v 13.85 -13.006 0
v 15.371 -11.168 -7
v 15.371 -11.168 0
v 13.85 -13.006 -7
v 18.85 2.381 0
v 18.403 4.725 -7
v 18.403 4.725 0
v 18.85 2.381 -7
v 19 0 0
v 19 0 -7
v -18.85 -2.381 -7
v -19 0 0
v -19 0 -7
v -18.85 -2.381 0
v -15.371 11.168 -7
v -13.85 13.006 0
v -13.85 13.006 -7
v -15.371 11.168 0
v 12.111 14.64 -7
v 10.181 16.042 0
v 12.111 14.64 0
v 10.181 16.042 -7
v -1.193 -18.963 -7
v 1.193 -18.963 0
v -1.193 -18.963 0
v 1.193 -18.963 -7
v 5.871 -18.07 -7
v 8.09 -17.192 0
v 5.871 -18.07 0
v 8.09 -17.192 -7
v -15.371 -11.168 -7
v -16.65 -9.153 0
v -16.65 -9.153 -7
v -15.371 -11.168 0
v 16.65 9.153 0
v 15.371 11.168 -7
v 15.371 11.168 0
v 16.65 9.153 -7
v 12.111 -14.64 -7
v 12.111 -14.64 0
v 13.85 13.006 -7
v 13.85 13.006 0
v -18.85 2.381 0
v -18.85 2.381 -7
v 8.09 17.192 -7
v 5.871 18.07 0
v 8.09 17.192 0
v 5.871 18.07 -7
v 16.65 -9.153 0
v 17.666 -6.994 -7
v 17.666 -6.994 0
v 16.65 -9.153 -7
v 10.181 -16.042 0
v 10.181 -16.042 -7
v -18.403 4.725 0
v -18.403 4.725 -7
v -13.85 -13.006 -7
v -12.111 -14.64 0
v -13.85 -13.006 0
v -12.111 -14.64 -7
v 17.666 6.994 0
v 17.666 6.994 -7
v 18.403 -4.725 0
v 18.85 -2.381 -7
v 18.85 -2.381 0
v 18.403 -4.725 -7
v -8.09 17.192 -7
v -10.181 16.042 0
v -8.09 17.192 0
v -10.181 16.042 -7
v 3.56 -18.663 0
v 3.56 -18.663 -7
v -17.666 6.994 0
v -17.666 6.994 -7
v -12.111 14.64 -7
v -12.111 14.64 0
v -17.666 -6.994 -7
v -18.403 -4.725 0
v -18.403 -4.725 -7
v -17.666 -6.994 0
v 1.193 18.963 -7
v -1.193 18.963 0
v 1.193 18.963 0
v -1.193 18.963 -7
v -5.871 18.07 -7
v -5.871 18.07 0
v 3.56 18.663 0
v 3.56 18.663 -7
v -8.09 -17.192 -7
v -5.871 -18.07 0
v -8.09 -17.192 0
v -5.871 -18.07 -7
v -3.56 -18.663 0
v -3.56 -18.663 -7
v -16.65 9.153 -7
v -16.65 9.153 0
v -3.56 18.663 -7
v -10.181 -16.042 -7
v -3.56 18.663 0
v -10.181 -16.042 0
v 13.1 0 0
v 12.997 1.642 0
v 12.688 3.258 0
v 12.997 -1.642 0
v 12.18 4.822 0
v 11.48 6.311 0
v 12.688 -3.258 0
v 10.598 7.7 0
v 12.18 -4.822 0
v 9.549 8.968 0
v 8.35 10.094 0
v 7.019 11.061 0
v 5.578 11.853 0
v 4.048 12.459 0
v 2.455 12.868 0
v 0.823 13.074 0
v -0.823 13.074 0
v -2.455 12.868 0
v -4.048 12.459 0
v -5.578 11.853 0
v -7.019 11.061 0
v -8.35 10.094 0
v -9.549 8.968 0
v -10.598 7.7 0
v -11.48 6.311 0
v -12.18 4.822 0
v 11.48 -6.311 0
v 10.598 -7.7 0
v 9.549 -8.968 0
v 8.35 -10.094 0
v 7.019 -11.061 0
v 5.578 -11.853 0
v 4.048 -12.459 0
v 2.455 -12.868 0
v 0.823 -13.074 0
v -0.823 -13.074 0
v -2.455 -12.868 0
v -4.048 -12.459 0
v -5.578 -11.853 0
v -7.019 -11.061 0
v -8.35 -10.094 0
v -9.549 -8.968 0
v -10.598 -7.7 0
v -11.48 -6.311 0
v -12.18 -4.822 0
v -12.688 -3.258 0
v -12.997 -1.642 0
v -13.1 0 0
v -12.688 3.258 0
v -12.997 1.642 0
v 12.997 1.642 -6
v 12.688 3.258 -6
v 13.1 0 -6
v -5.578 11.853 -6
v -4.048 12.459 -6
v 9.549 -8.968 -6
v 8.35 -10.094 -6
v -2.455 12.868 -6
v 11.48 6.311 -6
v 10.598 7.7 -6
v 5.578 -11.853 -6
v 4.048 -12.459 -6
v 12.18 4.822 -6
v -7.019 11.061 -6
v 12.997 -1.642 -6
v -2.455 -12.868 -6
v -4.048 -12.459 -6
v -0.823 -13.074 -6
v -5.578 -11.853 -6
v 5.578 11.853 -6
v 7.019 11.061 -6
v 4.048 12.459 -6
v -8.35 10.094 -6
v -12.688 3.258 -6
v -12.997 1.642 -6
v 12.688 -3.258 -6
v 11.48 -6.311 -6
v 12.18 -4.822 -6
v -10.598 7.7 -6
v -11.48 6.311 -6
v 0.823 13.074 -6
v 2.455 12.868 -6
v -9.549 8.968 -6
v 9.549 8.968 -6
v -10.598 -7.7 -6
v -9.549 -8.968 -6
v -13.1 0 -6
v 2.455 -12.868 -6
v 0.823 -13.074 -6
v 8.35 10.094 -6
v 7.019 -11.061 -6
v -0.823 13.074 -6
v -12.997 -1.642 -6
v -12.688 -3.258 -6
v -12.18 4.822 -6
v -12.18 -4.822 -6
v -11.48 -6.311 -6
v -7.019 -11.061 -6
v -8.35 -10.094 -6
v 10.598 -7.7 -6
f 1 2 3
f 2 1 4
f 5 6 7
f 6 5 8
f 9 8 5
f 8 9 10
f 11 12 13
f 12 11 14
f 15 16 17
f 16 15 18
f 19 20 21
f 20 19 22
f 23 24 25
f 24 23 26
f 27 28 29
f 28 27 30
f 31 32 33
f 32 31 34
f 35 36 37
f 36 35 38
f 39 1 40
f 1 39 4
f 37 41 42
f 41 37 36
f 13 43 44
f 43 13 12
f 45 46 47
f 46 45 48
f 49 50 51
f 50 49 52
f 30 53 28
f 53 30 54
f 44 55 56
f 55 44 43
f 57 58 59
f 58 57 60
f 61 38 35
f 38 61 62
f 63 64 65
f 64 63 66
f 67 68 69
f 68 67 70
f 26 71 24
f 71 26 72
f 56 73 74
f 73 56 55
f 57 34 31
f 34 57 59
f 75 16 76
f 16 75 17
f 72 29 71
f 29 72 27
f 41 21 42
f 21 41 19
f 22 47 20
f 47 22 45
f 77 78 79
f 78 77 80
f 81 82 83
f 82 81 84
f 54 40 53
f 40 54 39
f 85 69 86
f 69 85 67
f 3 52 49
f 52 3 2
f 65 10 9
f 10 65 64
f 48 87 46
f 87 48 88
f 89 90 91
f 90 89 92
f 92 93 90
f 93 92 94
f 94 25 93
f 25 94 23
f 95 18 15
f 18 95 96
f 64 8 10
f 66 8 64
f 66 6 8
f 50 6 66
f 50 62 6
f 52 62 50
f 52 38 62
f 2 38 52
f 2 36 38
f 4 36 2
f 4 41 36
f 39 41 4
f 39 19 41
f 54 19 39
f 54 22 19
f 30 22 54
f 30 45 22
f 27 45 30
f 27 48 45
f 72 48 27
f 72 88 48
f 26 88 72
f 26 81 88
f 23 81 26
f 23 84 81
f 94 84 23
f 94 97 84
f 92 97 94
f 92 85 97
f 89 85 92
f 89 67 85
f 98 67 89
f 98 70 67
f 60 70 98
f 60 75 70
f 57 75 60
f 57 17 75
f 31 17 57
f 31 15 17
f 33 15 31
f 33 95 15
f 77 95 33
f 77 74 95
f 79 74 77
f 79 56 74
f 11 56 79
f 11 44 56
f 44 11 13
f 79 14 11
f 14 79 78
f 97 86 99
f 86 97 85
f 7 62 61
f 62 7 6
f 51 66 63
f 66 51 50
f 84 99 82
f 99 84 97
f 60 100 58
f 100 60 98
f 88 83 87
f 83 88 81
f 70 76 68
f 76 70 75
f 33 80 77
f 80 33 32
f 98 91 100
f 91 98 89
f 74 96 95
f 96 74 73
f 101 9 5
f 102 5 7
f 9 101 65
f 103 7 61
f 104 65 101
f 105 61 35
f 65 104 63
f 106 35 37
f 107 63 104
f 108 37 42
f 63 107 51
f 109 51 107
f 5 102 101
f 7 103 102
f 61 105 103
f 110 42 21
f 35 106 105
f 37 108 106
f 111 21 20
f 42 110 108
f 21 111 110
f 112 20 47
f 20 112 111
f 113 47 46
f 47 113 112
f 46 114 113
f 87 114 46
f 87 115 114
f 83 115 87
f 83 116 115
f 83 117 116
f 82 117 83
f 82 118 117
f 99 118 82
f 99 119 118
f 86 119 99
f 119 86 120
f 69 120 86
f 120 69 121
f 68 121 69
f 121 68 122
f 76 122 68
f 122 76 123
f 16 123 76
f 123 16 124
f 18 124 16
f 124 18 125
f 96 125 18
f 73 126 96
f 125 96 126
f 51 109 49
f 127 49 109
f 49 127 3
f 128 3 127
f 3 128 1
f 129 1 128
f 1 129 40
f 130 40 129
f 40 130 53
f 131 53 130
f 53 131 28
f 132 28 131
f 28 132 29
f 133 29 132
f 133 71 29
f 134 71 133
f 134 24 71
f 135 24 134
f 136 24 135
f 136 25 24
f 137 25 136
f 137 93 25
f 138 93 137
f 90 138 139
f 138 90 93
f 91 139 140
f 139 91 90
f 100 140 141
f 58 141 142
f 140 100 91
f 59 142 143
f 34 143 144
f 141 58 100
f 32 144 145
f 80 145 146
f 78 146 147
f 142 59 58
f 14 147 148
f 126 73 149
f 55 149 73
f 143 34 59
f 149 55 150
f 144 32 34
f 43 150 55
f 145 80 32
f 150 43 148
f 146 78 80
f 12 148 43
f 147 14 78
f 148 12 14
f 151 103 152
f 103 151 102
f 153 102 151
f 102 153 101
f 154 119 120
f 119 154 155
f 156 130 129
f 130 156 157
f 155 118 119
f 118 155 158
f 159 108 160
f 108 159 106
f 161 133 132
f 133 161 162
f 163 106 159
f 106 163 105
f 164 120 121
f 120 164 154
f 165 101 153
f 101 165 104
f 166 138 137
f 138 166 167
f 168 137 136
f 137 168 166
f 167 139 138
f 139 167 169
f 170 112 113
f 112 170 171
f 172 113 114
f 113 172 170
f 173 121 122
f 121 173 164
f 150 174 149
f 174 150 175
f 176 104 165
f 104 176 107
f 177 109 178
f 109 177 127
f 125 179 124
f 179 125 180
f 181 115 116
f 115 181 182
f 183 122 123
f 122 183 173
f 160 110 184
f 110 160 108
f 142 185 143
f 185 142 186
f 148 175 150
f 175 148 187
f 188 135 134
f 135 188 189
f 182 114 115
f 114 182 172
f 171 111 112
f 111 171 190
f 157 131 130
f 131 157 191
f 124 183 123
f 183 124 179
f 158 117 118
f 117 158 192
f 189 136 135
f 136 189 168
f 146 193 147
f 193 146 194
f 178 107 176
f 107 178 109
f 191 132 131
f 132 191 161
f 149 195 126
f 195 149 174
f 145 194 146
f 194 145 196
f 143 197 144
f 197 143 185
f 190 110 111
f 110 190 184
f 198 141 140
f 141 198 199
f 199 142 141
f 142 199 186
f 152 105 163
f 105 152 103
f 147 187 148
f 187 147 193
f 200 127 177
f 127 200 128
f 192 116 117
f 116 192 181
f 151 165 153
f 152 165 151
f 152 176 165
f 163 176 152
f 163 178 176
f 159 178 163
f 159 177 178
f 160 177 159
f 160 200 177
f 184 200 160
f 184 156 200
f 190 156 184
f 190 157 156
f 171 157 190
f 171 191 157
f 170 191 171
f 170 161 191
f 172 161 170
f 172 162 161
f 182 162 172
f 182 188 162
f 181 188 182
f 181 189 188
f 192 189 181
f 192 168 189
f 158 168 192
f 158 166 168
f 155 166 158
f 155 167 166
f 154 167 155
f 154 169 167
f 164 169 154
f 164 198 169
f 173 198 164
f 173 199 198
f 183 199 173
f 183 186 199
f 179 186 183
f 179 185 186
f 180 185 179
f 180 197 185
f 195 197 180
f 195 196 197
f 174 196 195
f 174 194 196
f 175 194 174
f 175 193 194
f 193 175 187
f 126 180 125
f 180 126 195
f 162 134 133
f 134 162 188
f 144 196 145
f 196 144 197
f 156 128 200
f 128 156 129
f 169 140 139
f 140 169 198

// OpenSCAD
$fn = 50;


difference() {
	union() {
		translate(v = [0, 0, -7.0000000000]) {
			cylinder(h = 7, r = 19.0000000000);
		}
	}
	union() {
		#translate(v = [0, 0, -6.0000000000]) {
			cylinder(h = 6, r = 13.1000000000);
		}
	}
}
